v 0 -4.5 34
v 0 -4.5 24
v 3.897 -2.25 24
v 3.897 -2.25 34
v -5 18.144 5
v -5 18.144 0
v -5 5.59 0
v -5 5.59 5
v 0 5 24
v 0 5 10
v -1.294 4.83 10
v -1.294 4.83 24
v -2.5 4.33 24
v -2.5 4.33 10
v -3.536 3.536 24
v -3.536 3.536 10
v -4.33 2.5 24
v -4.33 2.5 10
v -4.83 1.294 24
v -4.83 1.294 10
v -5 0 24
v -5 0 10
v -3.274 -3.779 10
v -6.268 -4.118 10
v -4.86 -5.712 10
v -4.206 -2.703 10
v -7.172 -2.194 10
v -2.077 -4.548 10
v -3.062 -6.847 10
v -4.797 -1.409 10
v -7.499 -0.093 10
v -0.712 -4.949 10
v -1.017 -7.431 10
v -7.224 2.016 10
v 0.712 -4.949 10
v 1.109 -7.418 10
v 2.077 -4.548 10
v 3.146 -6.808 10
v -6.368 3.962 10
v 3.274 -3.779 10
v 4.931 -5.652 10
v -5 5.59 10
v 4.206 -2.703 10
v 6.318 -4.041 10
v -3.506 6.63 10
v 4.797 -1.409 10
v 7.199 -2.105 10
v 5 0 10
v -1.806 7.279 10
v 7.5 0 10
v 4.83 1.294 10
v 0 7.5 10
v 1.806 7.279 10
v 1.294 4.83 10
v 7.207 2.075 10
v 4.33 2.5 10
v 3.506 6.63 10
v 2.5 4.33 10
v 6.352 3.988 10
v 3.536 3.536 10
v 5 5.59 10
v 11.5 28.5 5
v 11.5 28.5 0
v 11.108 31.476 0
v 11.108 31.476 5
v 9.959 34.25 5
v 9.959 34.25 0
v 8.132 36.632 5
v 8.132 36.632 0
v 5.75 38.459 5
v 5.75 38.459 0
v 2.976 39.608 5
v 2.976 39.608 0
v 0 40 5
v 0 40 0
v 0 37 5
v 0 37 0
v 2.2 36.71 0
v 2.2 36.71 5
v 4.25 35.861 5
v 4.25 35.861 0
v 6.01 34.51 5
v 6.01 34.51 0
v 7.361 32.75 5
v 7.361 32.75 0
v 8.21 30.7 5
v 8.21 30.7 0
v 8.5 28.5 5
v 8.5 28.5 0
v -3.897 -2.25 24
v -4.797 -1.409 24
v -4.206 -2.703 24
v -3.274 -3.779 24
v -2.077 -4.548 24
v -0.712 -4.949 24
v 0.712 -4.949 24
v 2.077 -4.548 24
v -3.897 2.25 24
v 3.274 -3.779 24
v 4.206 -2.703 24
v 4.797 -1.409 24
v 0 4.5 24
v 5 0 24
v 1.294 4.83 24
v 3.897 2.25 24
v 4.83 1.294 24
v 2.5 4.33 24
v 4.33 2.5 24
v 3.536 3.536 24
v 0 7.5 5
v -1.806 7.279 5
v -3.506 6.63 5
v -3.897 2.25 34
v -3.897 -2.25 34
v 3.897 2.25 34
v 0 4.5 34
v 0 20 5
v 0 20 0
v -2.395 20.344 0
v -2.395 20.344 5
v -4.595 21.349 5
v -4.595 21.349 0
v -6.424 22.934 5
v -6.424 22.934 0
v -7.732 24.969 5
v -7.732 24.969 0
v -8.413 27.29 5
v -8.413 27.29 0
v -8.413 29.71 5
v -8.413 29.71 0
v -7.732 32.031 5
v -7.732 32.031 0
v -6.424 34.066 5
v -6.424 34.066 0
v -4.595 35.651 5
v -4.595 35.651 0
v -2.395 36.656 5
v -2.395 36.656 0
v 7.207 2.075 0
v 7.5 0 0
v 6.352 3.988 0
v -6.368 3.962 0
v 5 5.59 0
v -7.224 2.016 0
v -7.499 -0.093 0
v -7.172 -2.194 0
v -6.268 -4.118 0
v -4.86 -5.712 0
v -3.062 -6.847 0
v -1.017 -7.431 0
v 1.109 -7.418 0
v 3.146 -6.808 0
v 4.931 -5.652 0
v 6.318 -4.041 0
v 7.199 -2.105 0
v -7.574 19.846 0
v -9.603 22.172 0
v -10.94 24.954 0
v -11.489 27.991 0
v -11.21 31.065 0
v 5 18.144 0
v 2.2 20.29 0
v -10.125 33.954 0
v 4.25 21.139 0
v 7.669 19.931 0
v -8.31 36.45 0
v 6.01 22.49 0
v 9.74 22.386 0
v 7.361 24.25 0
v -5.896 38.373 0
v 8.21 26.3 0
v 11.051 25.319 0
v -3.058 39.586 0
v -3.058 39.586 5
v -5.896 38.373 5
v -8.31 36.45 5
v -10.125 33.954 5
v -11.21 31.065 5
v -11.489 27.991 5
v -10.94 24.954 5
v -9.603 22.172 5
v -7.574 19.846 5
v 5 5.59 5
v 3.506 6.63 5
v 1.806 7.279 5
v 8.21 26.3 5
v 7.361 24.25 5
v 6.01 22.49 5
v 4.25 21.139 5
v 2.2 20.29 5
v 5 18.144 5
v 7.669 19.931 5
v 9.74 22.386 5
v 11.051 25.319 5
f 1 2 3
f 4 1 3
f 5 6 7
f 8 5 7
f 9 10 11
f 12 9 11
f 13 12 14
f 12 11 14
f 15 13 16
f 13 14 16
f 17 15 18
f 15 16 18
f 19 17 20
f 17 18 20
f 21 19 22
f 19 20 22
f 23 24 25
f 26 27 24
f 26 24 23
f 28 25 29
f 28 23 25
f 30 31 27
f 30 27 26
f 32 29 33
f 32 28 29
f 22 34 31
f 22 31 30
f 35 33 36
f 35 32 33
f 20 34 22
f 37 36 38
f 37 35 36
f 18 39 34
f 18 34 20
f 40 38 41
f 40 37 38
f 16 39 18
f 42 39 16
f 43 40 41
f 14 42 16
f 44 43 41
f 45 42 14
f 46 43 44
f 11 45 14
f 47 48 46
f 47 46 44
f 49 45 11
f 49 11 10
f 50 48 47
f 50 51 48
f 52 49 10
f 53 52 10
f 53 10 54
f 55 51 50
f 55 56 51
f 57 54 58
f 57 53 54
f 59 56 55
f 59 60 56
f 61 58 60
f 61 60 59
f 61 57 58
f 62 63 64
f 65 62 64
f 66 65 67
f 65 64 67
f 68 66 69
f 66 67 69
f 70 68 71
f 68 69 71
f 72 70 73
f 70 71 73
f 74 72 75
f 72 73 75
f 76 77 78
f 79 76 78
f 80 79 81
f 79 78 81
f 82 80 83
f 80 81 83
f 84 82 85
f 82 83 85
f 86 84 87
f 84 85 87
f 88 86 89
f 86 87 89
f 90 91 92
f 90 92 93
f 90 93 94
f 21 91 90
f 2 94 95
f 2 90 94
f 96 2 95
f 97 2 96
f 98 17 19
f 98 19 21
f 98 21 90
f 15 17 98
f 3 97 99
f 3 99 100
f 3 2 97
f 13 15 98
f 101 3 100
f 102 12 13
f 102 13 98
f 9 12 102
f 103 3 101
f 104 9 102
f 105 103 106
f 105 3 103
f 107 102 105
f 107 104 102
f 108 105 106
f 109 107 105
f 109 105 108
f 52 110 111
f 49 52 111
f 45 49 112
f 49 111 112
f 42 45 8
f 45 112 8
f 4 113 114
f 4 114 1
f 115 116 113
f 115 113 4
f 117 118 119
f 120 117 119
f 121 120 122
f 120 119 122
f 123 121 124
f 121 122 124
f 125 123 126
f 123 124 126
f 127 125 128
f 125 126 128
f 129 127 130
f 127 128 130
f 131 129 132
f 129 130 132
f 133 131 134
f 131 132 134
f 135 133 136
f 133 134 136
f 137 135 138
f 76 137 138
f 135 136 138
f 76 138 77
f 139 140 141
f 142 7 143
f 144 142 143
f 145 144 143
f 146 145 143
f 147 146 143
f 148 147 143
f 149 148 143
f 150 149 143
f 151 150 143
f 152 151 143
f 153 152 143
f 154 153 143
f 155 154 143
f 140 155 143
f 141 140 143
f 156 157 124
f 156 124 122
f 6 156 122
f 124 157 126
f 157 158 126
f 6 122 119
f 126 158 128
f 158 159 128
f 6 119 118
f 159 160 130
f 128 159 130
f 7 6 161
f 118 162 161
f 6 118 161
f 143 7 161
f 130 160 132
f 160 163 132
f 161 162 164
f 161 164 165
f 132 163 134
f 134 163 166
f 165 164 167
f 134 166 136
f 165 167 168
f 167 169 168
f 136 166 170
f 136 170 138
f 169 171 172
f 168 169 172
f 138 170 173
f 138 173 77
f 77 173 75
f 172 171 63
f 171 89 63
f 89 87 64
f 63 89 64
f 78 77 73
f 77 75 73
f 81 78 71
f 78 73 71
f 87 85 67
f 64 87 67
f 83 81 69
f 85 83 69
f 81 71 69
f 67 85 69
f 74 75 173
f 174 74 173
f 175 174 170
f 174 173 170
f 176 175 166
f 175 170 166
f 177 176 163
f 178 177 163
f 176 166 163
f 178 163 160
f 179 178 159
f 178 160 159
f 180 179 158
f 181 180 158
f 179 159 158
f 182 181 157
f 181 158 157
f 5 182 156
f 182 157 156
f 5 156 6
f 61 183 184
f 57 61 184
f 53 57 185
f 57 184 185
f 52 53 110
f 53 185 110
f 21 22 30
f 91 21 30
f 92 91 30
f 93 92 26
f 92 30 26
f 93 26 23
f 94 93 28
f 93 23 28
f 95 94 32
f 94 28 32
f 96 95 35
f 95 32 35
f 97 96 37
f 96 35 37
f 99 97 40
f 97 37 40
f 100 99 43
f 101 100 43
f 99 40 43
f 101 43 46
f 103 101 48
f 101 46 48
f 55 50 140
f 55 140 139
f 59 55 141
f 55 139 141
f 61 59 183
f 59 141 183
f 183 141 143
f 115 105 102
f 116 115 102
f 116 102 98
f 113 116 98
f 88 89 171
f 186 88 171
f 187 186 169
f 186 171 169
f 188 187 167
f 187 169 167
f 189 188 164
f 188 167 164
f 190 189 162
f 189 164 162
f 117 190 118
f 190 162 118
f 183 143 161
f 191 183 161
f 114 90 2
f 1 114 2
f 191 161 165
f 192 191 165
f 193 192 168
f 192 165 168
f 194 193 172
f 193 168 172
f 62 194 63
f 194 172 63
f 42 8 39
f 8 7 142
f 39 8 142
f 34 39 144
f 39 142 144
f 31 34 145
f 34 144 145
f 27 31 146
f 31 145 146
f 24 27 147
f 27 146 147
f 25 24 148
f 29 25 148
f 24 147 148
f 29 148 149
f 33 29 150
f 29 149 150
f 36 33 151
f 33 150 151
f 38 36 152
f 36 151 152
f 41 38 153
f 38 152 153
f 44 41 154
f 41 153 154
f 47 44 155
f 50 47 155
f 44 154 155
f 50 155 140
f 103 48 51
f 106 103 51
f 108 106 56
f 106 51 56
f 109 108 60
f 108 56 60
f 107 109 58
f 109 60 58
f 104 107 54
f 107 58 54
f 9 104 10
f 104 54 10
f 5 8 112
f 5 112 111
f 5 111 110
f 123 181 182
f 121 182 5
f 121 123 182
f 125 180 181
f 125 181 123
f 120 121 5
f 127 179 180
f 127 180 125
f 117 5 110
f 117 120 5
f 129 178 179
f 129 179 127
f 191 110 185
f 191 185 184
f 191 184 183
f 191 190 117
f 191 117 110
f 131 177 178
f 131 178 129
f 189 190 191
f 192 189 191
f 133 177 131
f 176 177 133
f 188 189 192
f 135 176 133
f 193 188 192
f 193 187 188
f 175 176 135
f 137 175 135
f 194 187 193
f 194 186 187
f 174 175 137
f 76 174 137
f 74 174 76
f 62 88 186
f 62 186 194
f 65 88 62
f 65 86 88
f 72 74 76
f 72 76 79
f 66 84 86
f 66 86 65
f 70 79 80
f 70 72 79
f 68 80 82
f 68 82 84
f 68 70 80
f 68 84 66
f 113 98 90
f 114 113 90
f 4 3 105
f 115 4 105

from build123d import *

# Parameters (mm, degrees)
F1_DEPTH = 5
F2_DEPTH = 10
F3_DEPTH = 24
F4_DEPTH = 34


with BuildPart() as f1:
    # F0 (on Top) → F1 (new body)
    with BuildSketch(Plane.XY):
        with BuildLine():
            ThreePointArc((0, 40), (-11.2103927734, 31.0645845405), (-5, 18.1438424114))
            Line((-5, 18.1438424114), (-5, 19.8613982648))
            Line((-5, 19.8613982648), (0, 19.8613982648))
            Line((0, 19.8613982648), (0, 20))
            ThreePointArc((0, 20), (-8.5, 28.5), (0, 37))
            Line((0, 37), (0, 40))
        make_face()
        with BuildLine():
            Line((5, 19.8613982648), (5, 18.1438424114))
            ThreePointArc((5, 18.1438424114), (9.7403798694, 22.3864903697), (11.5, 28.5))
            ThreePointArc((11.5, 28.5), (8.1317279836, 36.6317279836), (0, 40))
            Line((0, 40), (0, 37))
            ThreePointArc((0, 37), (6.0104076401, 34.5104076401), (8.5, 28.5))
            ThreePointArc((8.5, 28.5), (6.0104076401, 22.4895923599), (0, 20))
            Line((0, 20), (0, 19.8613982648))
            Line((0, 19.8613982648), (5, 19.8613982648))
        make_face()
        with BuildLine():
            ThreePointArc((0, 17), (2.5645845405, 17.2896072266), (5, 18.1438424114))
            Line((5, 18.1438424114), (5, 19.8613982648))
            Line((5, 19.8613982648), (0, 19.8613982648))
            Line((0, 19.8613982648), (0, 17))
        make_face()
        with BuildLine():
            Line((-5, 19.8613982648), (-5, 18.1438424114))
            ThreePointArc((-5, 18.1438424114), (-2.5645845405, 17.2896072266), (0, 17))
            Line((0, 17), (0, 19.8613982648))
            Line((0, 19.8613982648), (-5, 19.8613982648))
        make_face()
        with BuildLine():
            Line((-5, 18.1438424114), (-5, 5.5901699437))
            ThreePointArc((-5, 5.5901699437), (-2.6761656733, 7.0062926922), (0, 7.5))
            Line((0, 7.5), (0, 17))
            ThreePointArc((0, 17), (-2.5645845405, 17.2896072266), (-5, 18.1438424114))
        make_face()
        with BuildLine():
            ThreePointArc((0, 7.5), (2.6761656733, 7.0062926922), (5, 5.5901699437))
            Line((5, 5.5901699437), (5, 18.1438424114))
            ThreePointArc((5, 18.1438424114), (2.5645845405, 17.2896072266), (0, 17))
            Line((0, 17), (0, 7.5))
        make_face()
    extrude(amount=F1_DEPTH)

    # F0 (on Top) → F2 (join)
    with BuildSketch(Plane.XY):
        with BuildLine():
            Line((5, 0), (5, 5.5901699437))
            ThreePointArc((5, 5.5901699437), (2.6761656733, 7.0062926922), (0, 7.5))
            Line((0, 7.5), (0, 5))
            ThreePointArc((0, 5), (3.5355339059, 3.5355339059), (5, 0))
        make_face()
        with BuildLine():
            ThreePointArc((-5, 5.5901699437), (-3.0618621785, -6.8465319688), (7.5, 0))
            ThreePointArc((7.5, 0), (6.8465319688, 3.0618621785), (5, 5.5901699437))
            Line((5, 5.5901699437), (5, 0))
            ThreePointArc((5, 0), (0, -5), (-5, 0))
            Line((-5, 0), (-5, 5.5901699437))
        make_face()
        with BuildLine():
            ThreePointArc((0, 7.5), (-2.6761656733, 7.0062926922), (-5, 5.5901699437))
            Line((-5, 5.5901699437), (-5, 0))
            ThreePointArc((-5, 0), (-3.5355339059, 3.5355339059), (0, 5))
            Line((0, 5), (0, 7.5))
        make_face()
    extrude(amount=F2_DEPTH)

    # F0 (on Top) → F3 (join)
    with BuildSketch(Plane.XY):
        with BuildLine():
            Line((3.897114317, 0), (5, 0))
            ThreePointArc((5, 0), (3.5355339059, 3.5355339059), (0, 5))
            Line((0, 5), (0, 4.5))
            Line((0, 4.5), (3.897114317, 2.25))
            Line((3.897114317, 2.25), (3.897114317, 0))
        make_face()
        with BuildLine():
            ThreePointArc((-5, 0), (0, -5), (5, 0))
            Line((5, 0), (3.897114317, 0))
            Line((3.897114317, 0), (3.897114317, -2.25))
            Line((3.897114317, -2.25), (0, -4.5))
            Line((0, -4.5), (-3.897114317, -2.25))
            Line((-3.897114317, -2.25), (-3.897114317, 0))
            Line((-3.897114317, 0), (-5, 0))
        make_face()
        with BuildLine():
            ThreePointArc((0, 5), (-3.5355339059, 3.5355339059), (-5, 0))
            Line((-5, 0), (-3.897114317, 0))
            Line((-3.897114317, 0), (-3.897114317, 2.25))
            Line((-3.897114317, 2.25), (0, 4.5))
            Line((0, 4.5), (0, 5))
        make_face()
    extrude(amount=F3_DEPTH)

    # F0 (on Top) → F4 (join)
    with BuildSketch(Plane.XY):
        Polygon((3.897114317, 2.25), (0, 4.5), (0, 0), align=None)
        Polygon((0, 0), (3.897114317, 0), (3.897114317, 2.25), align=None)
        Polygon((3.897114317, -2.25), (3.897114317, 0), (0, 0), align=None)
        Polygon((3.897114317, -2.25), (0, 0), (0, -4.5), align=None)
        Polygon((0, -4.5), (0, 0), (-3.897114317, -2.25), align=None)
        Polygon((0, 0), (-3.897114317, 0), (-3.897114317, -2.25), align=None)
        Polygon((-3.897114317, 2.25), (-3.897114317, 0), (0, 0), align=None)
        Polygon((0, 0), (0, 4.5), (-3.897114317, 2.25), align=None)
    extrude(amount=F4_DEPTH)


solid = f1.part
